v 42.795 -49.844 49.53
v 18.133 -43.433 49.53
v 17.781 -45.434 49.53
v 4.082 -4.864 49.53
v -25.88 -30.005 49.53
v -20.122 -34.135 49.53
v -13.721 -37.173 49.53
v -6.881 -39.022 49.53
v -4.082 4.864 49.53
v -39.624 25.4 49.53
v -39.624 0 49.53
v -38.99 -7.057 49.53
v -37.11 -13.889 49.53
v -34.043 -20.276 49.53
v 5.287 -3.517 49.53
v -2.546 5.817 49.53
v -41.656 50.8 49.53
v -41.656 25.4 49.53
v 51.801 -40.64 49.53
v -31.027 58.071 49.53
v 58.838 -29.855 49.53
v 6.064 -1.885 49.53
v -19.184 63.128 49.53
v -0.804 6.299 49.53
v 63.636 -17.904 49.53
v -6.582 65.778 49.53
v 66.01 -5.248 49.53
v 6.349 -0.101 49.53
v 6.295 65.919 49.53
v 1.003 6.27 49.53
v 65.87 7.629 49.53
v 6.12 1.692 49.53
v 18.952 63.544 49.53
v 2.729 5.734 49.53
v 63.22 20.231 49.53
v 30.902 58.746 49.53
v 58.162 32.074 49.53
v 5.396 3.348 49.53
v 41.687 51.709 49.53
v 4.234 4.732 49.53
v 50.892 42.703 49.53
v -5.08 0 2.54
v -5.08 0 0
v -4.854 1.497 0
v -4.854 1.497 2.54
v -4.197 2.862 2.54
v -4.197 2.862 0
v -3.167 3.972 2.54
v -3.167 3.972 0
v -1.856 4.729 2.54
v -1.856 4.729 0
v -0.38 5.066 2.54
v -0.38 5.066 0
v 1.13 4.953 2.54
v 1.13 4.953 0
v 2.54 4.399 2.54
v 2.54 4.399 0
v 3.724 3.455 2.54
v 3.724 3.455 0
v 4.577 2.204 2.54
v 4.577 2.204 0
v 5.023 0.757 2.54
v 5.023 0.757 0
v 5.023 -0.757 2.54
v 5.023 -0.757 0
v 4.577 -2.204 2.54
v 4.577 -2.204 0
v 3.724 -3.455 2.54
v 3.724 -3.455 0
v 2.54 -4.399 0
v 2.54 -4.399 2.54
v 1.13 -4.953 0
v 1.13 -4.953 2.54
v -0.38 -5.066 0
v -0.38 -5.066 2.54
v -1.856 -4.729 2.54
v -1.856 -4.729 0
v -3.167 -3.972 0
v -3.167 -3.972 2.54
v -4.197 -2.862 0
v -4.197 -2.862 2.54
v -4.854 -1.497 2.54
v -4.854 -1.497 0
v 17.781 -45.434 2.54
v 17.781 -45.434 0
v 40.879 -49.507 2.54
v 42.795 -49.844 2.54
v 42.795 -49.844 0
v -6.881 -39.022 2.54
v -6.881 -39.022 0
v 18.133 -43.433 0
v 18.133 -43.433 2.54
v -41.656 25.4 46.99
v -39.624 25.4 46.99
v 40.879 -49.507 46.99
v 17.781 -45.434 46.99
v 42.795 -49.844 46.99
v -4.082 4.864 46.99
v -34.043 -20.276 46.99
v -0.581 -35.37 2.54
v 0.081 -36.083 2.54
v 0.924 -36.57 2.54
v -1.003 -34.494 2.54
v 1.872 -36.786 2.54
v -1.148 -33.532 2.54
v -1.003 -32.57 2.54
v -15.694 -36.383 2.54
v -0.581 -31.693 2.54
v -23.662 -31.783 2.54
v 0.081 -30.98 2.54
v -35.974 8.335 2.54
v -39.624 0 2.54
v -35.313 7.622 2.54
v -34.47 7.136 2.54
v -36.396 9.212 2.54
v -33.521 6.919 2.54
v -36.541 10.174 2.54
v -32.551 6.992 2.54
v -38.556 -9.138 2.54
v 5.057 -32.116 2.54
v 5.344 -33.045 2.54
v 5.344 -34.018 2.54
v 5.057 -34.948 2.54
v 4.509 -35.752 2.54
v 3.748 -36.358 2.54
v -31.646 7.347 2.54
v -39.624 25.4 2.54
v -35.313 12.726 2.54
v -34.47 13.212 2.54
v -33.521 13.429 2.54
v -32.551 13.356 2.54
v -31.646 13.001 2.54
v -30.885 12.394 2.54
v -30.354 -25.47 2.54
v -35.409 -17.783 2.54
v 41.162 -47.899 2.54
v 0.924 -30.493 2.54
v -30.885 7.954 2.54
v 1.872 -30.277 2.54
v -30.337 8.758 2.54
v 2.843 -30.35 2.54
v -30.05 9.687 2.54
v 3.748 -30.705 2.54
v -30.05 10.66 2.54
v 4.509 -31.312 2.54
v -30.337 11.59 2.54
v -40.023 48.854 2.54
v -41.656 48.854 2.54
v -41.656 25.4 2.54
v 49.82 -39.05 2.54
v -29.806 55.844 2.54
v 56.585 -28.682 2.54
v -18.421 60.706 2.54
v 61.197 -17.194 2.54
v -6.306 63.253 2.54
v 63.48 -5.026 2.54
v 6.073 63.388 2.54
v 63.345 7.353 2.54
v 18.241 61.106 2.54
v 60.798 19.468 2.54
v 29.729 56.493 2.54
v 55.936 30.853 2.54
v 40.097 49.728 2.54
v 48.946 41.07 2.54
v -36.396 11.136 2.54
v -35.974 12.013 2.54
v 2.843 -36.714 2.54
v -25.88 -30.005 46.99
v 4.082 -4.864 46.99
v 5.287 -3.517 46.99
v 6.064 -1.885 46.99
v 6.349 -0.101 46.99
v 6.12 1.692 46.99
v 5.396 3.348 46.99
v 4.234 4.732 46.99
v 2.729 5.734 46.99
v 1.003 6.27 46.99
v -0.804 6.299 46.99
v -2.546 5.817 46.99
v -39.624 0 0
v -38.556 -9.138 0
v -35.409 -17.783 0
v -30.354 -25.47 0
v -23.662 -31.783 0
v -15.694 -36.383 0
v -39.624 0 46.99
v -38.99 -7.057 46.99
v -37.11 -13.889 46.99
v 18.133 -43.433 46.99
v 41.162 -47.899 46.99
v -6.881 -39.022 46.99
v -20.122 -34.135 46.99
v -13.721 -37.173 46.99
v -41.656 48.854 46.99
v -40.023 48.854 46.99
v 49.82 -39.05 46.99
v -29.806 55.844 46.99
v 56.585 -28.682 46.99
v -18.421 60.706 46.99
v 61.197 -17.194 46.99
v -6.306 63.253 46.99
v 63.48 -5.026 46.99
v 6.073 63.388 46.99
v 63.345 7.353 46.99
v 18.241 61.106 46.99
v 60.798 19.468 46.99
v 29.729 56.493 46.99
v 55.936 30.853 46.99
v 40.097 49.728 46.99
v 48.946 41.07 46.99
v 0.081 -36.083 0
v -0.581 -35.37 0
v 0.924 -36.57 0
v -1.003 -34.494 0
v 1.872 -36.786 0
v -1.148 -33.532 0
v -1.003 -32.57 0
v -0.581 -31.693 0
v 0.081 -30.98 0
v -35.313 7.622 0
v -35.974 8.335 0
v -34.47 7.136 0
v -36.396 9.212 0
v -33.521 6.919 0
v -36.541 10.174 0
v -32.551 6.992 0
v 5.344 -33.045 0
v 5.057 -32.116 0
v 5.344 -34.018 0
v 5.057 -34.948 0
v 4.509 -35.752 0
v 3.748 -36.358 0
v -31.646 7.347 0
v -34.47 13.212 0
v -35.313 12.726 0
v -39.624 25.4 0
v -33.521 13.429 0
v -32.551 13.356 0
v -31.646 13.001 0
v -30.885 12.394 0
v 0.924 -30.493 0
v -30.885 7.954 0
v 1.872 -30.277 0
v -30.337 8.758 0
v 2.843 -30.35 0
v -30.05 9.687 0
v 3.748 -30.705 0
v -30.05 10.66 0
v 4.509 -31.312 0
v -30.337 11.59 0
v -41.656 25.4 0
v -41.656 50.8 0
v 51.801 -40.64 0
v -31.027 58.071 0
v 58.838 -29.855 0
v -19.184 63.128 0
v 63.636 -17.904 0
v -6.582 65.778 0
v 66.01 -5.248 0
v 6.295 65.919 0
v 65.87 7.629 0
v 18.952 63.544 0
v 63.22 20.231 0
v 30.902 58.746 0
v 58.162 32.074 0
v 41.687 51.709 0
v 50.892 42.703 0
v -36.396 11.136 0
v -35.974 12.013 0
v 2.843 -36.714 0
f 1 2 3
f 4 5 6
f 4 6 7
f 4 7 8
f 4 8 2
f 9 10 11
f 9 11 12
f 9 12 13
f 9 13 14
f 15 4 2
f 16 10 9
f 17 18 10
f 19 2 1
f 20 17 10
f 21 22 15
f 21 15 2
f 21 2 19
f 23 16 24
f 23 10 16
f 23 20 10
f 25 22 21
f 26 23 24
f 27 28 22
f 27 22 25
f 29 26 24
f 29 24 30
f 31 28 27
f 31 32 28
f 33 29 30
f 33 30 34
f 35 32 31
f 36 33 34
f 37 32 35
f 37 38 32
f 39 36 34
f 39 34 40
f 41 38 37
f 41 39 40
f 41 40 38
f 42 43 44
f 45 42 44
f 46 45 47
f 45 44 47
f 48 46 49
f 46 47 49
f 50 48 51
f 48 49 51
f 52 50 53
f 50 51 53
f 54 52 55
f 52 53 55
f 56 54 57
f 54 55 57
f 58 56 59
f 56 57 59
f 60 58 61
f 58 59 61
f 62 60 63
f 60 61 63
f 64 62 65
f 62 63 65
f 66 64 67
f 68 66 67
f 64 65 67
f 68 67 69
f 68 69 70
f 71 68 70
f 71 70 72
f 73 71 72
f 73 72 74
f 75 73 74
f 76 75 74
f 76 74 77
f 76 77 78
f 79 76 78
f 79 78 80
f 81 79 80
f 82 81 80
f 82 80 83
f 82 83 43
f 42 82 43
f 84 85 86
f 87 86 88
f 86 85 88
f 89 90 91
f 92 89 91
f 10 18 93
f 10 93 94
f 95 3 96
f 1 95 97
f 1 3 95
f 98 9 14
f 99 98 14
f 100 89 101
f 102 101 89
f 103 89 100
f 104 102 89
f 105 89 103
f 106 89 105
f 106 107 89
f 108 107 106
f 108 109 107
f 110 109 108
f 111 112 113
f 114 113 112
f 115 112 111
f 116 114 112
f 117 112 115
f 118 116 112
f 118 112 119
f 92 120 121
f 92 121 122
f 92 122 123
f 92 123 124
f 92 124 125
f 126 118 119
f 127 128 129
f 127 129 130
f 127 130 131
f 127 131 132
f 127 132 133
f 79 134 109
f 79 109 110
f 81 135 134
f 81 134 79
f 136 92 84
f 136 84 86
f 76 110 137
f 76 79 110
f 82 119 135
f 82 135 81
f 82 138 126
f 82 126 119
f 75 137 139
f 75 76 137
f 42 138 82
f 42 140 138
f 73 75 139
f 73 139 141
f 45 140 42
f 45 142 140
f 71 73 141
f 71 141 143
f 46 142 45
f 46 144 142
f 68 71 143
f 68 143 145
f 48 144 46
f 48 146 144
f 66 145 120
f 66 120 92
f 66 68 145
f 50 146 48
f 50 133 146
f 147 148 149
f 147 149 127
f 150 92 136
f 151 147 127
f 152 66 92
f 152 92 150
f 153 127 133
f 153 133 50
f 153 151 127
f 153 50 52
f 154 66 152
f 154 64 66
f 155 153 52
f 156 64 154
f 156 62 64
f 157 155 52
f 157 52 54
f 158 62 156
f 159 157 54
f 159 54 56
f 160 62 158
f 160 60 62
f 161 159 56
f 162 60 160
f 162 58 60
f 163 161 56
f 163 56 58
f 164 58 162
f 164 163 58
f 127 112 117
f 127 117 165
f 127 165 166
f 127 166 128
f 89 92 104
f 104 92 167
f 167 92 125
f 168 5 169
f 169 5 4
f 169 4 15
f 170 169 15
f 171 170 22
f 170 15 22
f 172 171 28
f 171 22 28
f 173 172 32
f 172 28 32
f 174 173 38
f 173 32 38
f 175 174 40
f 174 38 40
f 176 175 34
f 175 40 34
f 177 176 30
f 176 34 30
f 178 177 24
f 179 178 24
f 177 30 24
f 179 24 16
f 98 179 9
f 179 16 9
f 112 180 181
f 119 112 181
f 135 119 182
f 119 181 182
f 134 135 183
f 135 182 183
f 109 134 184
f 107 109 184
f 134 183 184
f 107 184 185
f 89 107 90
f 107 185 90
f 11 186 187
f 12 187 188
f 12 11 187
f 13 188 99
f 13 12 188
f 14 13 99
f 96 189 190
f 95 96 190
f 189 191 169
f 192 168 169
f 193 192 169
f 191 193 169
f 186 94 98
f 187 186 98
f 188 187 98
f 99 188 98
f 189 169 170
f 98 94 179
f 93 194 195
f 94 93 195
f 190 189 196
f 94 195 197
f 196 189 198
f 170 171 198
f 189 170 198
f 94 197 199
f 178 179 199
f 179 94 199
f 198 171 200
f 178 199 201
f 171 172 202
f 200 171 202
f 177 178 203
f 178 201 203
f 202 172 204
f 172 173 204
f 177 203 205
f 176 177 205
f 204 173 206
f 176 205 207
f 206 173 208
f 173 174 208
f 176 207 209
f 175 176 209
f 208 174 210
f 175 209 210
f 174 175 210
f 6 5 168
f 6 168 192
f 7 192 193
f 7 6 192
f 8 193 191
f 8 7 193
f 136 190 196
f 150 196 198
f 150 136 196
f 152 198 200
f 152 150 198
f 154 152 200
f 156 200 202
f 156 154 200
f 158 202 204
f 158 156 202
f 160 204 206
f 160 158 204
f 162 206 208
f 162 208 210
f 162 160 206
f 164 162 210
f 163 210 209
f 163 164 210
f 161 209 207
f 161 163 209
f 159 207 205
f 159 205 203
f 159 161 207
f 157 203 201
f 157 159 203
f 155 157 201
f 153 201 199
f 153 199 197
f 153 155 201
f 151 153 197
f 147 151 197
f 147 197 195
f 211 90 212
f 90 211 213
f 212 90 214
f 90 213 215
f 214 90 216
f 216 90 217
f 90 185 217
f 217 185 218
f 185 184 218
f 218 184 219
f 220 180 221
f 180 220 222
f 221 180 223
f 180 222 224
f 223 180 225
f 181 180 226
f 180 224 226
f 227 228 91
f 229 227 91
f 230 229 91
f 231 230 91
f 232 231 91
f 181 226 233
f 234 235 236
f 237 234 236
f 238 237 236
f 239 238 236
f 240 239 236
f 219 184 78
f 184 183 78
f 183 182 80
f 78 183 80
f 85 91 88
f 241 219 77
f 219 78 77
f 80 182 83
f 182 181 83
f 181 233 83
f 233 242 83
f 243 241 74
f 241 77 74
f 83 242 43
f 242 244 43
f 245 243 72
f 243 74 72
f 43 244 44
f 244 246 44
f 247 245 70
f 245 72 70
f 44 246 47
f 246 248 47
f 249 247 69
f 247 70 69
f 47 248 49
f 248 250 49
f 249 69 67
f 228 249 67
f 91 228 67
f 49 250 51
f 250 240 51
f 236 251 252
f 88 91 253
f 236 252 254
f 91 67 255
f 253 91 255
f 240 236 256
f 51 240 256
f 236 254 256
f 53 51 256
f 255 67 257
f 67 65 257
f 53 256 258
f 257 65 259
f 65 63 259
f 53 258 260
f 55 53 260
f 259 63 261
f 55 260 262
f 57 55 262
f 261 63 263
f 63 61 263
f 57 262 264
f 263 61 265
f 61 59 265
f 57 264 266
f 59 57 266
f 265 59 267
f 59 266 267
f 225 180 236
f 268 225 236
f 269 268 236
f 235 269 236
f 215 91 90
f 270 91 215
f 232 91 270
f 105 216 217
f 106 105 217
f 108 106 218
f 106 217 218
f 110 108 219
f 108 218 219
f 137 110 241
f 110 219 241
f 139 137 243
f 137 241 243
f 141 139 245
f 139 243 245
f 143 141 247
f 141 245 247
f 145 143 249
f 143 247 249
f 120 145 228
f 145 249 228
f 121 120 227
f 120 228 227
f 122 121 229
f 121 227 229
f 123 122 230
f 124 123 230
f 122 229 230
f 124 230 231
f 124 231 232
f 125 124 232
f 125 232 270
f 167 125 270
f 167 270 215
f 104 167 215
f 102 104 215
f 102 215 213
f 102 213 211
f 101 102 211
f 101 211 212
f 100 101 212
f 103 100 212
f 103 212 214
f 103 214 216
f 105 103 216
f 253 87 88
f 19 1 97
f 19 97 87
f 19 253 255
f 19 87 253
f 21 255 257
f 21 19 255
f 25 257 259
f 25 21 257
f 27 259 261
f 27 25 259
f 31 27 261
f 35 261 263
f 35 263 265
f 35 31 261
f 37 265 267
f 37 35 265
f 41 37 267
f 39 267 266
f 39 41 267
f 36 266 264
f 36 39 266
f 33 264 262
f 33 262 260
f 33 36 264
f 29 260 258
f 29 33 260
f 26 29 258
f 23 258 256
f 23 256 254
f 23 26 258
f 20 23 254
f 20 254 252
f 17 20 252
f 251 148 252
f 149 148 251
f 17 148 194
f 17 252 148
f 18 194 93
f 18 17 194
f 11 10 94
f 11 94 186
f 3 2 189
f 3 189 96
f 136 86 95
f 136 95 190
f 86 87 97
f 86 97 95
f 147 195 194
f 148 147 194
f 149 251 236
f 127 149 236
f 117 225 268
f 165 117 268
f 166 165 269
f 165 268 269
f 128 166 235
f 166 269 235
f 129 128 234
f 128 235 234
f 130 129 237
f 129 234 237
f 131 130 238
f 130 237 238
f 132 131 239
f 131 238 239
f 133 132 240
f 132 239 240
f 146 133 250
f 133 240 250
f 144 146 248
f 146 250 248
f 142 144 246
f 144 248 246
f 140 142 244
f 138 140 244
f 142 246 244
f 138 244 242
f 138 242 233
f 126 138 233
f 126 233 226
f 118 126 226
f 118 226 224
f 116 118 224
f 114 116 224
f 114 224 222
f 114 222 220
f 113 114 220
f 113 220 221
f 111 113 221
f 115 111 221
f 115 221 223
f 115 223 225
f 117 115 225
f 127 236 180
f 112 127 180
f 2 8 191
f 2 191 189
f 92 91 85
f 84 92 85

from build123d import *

# Parameters (mm, degrees)
SIDE_DEPTH             = 2.54
COVER_DEPTH            = 44.45
FLYWHEEL_SLIT_REACH    = 107.934
MOUNT_HOLES_REACH      = 107.934
SKETCH4_R              = 3.2639
AXLE_HOLDER_HOLE_REACH = 107.934
SKETCH5_R              = 5.08


with BuildPart() as part:
    # Sketch1 → Side (new body)
    with BuildSketch(Plane.XY):
        with BuildLine():
            Line((17.780628438, -45.433815472), (42.794745364, -49.844479185))
            ThreePointArc((42.794745364, -49.844479185), (50.891612275, 42.70313309), (-41.656, 50.8))
            Line((-41.656, 50.8), (-41.656, 25.4))
            Line((-41.656, 25.4), (-39.624, 25.4))
            Line((-39.624, 25.4), (-39.624, 0))
            Line((-39.624, 0), (0, 0))
            Line((0, 0), (-6.880635392, -39.022022405))
            Line((-6.880635392, -39.022022405), (18.133481535, -43.432686118))
            Line((18.133481535, -43.432686118), (17.780628438, -45.433815472))
        make_face()
        with BuildLine():
            Line((0, 0), (-39.624, 0))
            ThreePointArc((-39.624, 0), (-30.353745014, -25.469816246), (-6.880635392, -39.022022405))
            Line((-6.880635392, -39.022022405), (0, 0))
        make_face()
    side = extrude(amount=SIDE_DEPTH)

    # Sketch2 → Cover (add)
    with BuildSketch(Plane.XY.offset(2.54)):
        with BuildLine():
            Line((-40.023319471, 48.854247114), (-41.656, 48.854247114))
            Line((-41.656, 48.854247114), (-41.656, 50.8))
            ThreePointArc((-41.656, 50.8), (50.891612275, 42.70313309), (42.794745364, -49.844479185))
            Line((42.794745364, -49.844479185), (40.878552837, -49.506602742))
            Line((40.878552837, -49.506602742), (41.162064836, -47.898726299))
            ThreePointArc((41.162064836, -47.898726299), (48.945859389, 41.070452561), (-40.023319471, 48.854247114))
        make_face()
    extrude(amount=COVER_DEPTH)

    # Mirror1: Side across plane
    add(side.mirror(Plane.XY.offset(24.765)))

    # Sketch3 → Flywheel slit (cut, up to next)
    with BuildSketch(Plane.XY.offset(49.53), mode=Mode.PRIVATE) as flywheel_slit_sk1:
        with BuildLine():
            Line((-4.081701322, 4.864382214), (-37.159500375, -22.891186772))
            Line((-37.159500375, -22.891186772), (-28.996097732, -32.6199512))
            Line((-28.996097732, -32.6199512), (4.081701322, -4.864382214))
            ThreePointArc((4.081701322, -4.864382214), (4.864382214, 4.081701322), (-4.081701322, 4.864382214))
        make_face()
    flywheel_slit_tool1 = extrude(flywheel_slit_sk1.sketch, amount=-FLYWHEEL_SLIT_REACH, mode=Mode.PRIVATE) & part.part
    add(flywheel_slit_tool1.solids().sort_by_distance((-14.612688, -12.261501, 49.53))[0], mode=Mode.SUBTRACT)

    # Sketch4 → Mount holes (cut, up to next)
    with BuildSketch(Plane(origin=(0, 0, 0), x_dir=(-1, 0, 0), z_dir=(0, 0, -1)), mode=Mode.PRIVATE) as mount_holes_sk1:
        with Locations((-2.116217682, -33.531680079)):
            Circle(SKETCH4_R)
    mount_holes_tool1 = extrude(mount_holes_sk1.sketch, amount=-MOUNT_HOLES_REACH, mode=Mode.PRIVATE) & part.part
    # Sketch4 → Mount holes (cut, up to next)
    with BuildSketch(Plane(origin=(0, 0, 0), x_dir=(-1, 0, 0), z_dir=(0, 0, -1)), mode=Mode.PRIVATE) as mount_holes_sk2:
        with Locations((33.277492898, 10.173950581)):
            Circle(SKETCH4_R)
    mount_holes_tool2 = extrude(mount_holes_sk2.sketch, amount=-MOUNT_HOLES_REACH, mode=Mode.PRIVATE) & part.part
    add(mount_holes_tool1.solids().sort_by_distance((2.116218, -33.53168, 0))[0], mode=Mode.SUBTRACT)
    add(mount_holes_tool2.solids().sort_by_distance((-33.277493, 10.173951, 0))[0], mode=Mode.SUBTRACT)

    # Sketch5 → Axle Holder Hole (cut, up to next)
    with BuildSketch(Plane(origin=(0, 0, 0), x_dir=(-1, 0, 0), z_dir=(0, 0, -1)), mode=Mode.PRIVATE) as axle_holder_hole_sk1:
        Circle(SKETCH5_R)
    axle_holder_hole_tool1 = extrude(axle_holder_hole_sk1.sketch, amount=-AXLE_HOLDER_HOLE_REACH, mode=Mode.PRIVATE) & part.part
    add(axle_holder_hole_tool1.solids().sort_by_distance((0, 0, 0))[0], mode=Mode.SUBTRACT)


solid = part.part
